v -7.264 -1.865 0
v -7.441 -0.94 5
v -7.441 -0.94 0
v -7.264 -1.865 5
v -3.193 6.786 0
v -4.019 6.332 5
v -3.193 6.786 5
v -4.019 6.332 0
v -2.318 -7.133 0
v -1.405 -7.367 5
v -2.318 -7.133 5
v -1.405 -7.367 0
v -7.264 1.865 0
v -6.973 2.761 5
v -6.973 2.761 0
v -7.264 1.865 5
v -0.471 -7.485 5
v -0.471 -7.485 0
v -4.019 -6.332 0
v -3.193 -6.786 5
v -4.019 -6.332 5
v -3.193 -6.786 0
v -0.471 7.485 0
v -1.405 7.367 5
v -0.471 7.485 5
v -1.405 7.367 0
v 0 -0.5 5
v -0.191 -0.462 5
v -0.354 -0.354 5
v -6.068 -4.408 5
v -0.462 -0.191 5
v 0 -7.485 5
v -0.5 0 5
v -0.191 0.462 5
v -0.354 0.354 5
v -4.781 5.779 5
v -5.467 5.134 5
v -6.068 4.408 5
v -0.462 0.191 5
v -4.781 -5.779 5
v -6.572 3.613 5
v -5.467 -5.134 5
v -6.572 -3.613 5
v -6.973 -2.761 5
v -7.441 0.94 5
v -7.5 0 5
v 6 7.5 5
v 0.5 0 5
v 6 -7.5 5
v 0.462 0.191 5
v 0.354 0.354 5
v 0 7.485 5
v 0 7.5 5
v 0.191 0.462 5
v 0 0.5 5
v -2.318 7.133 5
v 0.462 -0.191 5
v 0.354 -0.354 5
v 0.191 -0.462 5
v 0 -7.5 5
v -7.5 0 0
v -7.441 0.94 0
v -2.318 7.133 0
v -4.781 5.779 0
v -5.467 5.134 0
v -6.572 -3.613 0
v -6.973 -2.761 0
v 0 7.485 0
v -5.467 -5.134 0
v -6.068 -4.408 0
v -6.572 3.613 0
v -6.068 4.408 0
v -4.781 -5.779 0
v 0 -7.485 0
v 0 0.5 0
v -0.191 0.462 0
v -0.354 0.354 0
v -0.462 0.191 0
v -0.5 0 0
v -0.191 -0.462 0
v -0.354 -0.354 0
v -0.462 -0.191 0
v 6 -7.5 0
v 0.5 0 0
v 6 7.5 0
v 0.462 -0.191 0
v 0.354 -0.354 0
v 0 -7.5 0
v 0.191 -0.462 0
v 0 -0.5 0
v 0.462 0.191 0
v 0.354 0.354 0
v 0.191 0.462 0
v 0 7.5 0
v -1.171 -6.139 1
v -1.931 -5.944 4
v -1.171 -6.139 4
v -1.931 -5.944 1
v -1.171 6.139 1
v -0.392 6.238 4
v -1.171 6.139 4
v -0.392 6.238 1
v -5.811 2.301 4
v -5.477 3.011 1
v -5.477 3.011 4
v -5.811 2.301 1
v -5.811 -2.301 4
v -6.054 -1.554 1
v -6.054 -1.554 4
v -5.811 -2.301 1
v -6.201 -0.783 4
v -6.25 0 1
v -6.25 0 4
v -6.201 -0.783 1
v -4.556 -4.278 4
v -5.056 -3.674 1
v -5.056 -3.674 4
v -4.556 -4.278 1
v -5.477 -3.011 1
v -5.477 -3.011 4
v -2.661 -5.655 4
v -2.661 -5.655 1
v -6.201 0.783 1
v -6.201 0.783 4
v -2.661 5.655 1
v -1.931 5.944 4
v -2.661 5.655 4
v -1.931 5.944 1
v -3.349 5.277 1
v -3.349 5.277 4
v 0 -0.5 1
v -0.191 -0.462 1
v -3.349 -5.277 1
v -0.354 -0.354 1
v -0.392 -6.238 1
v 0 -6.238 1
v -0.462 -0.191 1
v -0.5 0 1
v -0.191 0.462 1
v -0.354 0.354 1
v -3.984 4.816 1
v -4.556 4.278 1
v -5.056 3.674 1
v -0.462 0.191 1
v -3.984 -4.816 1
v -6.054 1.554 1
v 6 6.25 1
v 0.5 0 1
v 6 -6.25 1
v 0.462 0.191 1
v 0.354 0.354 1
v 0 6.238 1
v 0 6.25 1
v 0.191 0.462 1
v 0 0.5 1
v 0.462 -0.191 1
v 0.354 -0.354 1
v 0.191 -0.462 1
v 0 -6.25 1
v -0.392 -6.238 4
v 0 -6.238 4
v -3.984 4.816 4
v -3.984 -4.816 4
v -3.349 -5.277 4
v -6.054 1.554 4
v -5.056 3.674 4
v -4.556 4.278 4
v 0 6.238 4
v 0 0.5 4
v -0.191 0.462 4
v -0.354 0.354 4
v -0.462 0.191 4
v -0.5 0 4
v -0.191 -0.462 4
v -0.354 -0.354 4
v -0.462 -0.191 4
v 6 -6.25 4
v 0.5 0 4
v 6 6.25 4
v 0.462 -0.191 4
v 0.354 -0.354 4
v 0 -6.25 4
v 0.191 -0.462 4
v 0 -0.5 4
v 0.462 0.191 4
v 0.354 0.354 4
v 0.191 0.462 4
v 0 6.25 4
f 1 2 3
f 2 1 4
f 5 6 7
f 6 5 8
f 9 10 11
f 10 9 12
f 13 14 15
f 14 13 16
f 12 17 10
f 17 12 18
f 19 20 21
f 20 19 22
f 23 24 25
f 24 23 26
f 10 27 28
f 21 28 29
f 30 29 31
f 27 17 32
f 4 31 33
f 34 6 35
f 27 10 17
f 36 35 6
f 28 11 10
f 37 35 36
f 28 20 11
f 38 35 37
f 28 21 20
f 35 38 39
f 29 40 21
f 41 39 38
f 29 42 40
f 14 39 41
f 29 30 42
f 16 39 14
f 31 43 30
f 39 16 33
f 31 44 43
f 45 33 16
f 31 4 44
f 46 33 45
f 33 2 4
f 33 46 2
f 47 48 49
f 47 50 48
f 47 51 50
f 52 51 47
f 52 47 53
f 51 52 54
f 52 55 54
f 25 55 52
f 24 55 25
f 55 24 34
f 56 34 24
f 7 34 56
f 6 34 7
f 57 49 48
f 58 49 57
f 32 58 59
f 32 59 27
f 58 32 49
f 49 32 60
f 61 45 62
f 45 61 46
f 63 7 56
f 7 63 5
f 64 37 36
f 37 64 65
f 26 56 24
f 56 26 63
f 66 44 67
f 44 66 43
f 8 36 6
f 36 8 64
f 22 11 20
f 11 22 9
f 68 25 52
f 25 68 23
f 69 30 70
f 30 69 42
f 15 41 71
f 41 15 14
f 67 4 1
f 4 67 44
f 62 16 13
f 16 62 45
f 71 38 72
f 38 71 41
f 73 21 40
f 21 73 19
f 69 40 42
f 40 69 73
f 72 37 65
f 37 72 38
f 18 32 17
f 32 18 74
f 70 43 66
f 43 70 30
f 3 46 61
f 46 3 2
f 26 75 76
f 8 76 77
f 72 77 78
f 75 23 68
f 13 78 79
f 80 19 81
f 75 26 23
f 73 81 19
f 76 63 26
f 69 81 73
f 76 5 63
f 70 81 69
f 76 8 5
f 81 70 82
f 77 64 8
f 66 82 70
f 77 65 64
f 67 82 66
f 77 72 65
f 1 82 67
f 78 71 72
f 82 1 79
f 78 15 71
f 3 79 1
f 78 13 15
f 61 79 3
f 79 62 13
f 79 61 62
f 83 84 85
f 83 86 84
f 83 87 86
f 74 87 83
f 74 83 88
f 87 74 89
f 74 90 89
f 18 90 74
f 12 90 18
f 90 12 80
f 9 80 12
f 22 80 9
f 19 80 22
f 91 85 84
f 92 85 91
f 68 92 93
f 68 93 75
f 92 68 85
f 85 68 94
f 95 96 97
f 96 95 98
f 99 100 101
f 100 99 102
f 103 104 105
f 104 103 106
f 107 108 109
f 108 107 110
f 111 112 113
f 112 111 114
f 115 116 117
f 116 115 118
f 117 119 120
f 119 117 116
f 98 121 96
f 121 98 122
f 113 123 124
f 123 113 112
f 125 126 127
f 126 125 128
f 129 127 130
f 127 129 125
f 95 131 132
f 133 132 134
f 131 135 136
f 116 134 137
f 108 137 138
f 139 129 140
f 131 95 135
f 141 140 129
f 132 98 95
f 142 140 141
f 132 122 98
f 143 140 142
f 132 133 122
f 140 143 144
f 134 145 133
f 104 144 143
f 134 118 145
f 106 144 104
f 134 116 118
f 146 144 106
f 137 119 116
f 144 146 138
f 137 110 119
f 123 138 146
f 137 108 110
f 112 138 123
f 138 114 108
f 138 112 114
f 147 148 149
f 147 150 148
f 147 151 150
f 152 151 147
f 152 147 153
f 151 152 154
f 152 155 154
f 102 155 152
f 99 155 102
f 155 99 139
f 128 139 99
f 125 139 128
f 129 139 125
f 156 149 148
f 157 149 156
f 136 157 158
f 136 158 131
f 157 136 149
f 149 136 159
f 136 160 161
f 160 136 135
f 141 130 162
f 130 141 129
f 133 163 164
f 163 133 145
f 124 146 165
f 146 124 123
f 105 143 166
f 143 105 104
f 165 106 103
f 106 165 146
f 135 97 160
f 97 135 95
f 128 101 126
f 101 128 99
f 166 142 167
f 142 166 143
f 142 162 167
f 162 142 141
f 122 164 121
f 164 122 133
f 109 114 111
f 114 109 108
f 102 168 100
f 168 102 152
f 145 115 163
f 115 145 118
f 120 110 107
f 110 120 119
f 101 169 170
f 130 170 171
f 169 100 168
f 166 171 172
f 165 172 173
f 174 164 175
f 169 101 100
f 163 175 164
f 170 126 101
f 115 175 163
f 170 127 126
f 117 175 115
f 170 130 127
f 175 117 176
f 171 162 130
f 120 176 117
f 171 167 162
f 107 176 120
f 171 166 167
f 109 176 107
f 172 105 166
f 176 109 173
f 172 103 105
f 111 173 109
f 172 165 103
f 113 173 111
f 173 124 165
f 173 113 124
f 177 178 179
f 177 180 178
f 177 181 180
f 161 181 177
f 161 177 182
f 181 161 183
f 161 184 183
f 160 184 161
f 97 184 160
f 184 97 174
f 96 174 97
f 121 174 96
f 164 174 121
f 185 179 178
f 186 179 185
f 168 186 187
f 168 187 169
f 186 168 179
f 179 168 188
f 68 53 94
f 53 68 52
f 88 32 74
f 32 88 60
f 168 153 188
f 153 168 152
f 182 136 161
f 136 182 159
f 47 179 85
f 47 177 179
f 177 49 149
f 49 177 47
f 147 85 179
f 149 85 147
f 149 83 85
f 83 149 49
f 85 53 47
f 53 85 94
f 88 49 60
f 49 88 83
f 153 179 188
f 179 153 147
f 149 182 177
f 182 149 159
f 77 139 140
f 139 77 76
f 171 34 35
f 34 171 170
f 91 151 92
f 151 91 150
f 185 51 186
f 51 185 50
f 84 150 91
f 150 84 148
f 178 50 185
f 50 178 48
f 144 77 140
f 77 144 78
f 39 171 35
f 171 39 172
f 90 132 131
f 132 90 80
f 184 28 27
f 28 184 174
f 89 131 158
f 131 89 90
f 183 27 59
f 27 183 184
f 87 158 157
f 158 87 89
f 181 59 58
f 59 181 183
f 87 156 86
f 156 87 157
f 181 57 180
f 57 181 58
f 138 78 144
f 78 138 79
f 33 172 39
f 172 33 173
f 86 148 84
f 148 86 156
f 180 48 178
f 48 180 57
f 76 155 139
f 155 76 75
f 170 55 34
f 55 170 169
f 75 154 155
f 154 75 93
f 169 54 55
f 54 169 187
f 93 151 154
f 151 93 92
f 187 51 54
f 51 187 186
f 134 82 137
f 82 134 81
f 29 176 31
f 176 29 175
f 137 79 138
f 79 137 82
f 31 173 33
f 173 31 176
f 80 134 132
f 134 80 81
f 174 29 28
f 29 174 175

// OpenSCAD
//Battery dimensions in mm

battery_diameter=12;
battery_height=2.5;
tolerance=0.5;
wall_thickness=1;
difference()
{
	union()
	{
		difference()
		{
			cylinder(r=(battery_diameter/2)+tolerance+wall_thickness, h=battery_height+(tolerance)+(2*wall_thickness),$fn=50);

			translate([0,0,wall_thickness])
			cylinder(r=(battery_diameter/2)+(tolerance/2), h=battery_height+(tolerance),$fn=50);
			translate([0,-((battery_diameter/2)+2+tolerance),0])
			cube([battery_diameter+10,battery_diameter+5,battery_height+5]);

		}

		difference()
		{
			translate([0,-((battery_diameter/2)+wall_thickness+tolerance),0])
			cube([battery_diameter/2,battery_diameter+(2*wall_thickness)+(2*tolerance),battery_height+(2*wall_thickness)+tolerance]);

			translate([0,-((battery_diameter/2))-(tolerance/2),wall_thickness])
			cube([battery_diameter+tolerance,battery_diameter+tolerance,battery_height+tolerance]);
		}
	}
	translate([0,0,-1])
	cylinder(r=0.5, h=battery_height+tolerance+10,$fn=16);
}
